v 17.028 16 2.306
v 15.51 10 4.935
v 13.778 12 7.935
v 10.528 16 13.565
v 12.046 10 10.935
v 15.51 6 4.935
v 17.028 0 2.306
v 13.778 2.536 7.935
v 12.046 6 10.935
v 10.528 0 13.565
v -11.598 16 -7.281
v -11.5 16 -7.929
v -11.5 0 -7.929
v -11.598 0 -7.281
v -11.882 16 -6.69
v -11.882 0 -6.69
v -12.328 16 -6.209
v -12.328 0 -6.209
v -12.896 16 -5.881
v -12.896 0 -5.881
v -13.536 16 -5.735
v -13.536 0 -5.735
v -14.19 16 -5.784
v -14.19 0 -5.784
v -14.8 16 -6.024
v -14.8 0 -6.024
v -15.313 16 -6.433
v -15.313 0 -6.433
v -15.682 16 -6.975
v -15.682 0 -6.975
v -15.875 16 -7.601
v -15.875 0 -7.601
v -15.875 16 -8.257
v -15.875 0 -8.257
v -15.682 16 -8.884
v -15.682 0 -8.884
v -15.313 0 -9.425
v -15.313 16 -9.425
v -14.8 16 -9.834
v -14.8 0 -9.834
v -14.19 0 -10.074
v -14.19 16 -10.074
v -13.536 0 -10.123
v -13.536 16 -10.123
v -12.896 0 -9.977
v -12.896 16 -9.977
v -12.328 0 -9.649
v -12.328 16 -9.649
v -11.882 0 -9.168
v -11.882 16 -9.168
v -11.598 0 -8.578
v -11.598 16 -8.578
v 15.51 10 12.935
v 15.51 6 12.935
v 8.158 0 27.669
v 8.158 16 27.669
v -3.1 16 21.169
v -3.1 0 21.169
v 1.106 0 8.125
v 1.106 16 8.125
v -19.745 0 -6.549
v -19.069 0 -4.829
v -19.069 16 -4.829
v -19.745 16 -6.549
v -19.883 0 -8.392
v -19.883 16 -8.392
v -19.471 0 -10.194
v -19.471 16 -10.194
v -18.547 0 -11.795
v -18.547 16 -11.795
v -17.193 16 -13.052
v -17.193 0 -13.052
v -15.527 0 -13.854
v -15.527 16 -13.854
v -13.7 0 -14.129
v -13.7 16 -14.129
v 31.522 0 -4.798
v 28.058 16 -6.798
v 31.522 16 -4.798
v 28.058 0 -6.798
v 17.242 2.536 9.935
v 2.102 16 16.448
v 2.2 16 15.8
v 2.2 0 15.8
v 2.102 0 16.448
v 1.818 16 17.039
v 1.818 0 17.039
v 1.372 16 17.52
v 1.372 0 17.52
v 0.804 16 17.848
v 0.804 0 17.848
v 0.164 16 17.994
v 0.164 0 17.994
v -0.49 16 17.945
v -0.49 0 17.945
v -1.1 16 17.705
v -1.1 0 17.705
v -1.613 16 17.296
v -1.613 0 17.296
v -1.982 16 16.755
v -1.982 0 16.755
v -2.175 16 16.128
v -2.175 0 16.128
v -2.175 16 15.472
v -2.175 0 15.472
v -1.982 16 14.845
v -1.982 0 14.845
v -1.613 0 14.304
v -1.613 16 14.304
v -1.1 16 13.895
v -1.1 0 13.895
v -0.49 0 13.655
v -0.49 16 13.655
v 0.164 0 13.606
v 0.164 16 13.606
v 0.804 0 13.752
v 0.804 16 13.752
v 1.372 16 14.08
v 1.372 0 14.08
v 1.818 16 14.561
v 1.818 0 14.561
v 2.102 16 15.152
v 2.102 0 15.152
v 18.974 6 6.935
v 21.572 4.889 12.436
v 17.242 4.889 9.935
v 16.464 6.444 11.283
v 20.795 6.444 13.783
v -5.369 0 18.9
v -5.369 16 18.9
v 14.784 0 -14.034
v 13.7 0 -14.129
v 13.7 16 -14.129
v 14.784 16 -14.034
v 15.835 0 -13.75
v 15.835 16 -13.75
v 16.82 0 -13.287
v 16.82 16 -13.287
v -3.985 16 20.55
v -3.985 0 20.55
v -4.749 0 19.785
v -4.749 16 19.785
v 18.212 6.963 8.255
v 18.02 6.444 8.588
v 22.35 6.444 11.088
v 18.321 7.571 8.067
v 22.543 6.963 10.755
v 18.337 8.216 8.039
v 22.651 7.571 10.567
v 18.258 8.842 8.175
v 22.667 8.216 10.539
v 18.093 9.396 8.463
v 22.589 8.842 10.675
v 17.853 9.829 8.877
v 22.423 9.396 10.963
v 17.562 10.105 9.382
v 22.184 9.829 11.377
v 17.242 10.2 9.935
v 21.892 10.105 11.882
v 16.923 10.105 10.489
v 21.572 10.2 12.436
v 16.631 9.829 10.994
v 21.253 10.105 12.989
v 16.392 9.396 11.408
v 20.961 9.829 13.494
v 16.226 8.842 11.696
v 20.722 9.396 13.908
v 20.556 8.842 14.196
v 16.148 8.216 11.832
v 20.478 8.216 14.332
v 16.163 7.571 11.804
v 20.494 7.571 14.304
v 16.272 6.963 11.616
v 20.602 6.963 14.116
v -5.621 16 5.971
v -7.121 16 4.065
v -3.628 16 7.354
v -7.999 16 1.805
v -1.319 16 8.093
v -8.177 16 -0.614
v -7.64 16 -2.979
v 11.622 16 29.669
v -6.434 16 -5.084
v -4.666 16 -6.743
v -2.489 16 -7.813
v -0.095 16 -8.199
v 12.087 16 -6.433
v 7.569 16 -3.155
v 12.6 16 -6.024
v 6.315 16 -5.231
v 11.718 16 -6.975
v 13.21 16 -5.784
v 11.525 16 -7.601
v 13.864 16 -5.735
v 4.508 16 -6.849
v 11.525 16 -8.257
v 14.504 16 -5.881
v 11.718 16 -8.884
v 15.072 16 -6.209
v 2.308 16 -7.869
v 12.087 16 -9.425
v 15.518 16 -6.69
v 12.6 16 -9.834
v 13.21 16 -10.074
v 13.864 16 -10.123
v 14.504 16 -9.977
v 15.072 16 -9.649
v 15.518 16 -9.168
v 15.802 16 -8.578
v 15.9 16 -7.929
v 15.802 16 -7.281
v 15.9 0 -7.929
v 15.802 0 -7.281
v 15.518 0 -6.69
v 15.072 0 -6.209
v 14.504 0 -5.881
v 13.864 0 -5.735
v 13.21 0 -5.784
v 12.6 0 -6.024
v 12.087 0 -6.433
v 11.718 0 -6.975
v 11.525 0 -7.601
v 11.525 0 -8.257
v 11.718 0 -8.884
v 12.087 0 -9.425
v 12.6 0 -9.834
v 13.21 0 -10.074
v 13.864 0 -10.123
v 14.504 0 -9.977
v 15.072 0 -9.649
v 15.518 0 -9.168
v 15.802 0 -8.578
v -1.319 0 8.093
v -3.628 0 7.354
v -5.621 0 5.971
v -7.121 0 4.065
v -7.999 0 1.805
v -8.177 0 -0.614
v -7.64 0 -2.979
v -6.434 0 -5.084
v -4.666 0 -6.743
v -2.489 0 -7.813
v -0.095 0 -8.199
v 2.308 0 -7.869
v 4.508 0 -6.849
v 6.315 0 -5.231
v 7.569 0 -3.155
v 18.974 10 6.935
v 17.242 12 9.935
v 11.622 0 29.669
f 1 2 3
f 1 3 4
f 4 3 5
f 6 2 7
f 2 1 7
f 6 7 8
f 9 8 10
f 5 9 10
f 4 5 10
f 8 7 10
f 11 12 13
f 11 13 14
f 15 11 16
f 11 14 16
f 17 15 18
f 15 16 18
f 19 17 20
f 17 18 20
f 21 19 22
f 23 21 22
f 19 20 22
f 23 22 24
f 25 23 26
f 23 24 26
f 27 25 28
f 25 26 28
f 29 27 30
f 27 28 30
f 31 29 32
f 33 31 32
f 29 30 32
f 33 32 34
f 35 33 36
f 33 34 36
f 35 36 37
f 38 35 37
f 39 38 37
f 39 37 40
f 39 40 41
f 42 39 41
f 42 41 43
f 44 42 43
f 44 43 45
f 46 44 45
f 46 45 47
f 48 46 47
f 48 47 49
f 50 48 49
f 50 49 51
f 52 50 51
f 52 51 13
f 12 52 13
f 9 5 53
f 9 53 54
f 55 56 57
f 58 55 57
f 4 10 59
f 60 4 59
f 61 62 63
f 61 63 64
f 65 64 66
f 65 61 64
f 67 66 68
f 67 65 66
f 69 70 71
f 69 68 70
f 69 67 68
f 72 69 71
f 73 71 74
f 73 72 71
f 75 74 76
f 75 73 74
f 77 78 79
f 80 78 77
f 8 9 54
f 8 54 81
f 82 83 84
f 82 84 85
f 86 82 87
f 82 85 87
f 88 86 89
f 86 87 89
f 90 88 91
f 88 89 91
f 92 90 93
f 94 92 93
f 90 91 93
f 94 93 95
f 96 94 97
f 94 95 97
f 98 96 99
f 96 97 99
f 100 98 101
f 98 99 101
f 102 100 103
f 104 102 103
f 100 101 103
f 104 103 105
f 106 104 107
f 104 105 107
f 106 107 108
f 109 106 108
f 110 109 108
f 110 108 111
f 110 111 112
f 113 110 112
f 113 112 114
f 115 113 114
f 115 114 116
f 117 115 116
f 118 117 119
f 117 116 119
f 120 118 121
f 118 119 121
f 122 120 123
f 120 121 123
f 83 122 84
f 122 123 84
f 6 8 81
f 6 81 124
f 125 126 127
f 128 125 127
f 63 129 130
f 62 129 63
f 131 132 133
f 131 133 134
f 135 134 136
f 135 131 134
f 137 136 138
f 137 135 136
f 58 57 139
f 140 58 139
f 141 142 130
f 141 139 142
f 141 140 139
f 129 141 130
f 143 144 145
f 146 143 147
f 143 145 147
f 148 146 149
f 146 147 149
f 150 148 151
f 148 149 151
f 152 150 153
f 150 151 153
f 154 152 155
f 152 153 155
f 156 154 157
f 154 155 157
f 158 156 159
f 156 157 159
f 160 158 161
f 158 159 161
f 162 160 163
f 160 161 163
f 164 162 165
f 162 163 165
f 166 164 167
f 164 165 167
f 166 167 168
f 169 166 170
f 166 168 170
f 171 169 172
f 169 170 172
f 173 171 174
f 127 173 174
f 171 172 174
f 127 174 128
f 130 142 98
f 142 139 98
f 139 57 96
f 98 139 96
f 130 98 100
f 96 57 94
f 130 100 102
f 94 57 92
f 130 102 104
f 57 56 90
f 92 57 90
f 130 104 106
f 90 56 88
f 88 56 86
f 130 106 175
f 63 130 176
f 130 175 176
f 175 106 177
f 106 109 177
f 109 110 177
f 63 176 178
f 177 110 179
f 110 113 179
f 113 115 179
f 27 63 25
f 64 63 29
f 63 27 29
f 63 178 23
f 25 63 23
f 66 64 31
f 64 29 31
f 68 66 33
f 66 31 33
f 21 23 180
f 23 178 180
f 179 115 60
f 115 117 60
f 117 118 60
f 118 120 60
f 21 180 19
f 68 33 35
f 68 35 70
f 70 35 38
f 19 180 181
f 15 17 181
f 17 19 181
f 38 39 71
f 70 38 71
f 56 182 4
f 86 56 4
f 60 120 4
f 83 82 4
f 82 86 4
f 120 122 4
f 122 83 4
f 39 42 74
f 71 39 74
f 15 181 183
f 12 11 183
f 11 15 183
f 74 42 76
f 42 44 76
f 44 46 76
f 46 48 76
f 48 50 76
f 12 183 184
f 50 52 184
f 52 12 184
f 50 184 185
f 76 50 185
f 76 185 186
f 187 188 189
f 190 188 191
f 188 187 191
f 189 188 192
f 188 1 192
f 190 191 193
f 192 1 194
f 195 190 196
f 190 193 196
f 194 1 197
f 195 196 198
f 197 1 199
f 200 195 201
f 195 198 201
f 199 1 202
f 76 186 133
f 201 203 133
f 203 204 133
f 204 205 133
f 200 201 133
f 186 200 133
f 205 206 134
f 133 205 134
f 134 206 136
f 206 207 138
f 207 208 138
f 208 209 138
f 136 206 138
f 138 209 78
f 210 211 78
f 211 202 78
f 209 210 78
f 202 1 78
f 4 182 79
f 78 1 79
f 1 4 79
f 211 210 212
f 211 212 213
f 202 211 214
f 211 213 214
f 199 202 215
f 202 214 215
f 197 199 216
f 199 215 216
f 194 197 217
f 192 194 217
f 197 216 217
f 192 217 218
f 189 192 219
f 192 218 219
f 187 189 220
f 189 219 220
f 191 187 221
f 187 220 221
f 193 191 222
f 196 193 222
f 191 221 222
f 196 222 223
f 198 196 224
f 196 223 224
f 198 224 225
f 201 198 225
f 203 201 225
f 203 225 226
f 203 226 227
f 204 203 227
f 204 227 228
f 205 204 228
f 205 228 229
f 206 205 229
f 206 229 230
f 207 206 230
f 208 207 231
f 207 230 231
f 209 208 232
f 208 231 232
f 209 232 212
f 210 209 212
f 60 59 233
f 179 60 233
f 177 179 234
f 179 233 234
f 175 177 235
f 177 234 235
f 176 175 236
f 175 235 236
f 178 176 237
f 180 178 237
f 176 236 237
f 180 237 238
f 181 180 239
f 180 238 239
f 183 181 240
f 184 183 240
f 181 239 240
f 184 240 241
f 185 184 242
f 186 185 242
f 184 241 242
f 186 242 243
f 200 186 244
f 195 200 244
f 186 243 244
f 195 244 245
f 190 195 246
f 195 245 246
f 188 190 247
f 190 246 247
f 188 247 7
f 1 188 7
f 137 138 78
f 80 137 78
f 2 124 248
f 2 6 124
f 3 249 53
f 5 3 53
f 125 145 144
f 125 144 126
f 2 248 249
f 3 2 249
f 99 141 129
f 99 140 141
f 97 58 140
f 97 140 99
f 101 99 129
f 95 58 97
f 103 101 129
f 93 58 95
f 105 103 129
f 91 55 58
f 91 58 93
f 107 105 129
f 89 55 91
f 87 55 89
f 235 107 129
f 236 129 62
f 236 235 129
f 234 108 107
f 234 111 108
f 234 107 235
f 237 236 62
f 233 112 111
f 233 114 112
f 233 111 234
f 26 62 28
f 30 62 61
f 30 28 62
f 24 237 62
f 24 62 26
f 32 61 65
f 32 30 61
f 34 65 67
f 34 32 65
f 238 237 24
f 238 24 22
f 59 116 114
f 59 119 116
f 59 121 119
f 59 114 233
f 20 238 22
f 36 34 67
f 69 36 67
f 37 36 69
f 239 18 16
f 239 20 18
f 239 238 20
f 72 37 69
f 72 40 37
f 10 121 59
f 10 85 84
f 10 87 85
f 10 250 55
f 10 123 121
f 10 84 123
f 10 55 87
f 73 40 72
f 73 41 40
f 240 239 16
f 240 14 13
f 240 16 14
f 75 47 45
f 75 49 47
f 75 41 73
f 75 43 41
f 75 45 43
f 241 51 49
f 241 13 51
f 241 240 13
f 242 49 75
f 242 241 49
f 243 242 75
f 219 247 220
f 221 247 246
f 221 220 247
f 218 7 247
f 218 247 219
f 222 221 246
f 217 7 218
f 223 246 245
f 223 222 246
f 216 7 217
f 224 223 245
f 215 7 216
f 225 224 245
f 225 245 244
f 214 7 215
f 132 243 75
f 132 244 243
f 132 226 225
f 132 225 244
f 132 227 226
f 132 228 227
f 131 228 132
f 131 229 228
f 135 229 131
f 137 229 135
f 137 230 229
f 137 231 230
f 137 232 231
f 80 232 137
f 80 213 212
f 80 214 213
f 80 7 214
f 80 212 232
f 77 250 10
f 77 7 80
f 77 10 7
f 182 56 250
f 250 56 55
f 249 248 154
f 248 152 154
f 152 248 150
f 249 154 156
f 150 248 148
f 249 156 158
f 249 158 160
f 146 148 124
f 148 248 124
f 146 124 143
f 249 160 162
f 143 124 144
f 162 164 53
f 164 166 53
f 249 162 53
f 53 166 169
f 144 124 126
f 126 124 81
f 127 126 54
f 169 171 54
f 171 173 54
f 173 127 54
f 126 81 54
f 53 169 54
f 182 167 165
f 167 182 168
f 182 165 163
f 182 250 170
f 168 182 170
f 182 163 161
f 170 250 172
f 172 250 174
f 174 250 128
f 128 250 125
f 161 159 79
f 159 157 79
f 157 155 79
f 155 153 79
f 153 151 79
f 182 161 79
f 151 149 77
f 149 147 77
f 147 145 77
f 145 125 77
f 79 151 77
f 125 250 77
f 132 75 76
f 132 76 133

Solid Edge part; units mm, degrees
sketch "Sketch1" plane through (0, 0, 0) normal (0, -1, 0) x (1, 0, 0)
  line L0 (-5.3694, 18.9) -> (-19.0694, -4.8291)
  arc A0 (-13.7, -14.1291) -> (-19.0694, -4.8291) centre (-13.7, -7.9291) cw
  line L1 (-13.7, -14.1291) -> (13.7, -14.1291)
  arc A1 (19.0694, -4.8291) -> (13.7, -14.1291) centre (13.7, -7.9291) cw
  line L2 (5.3694, 18.9) -> (19.0694, -4.8291)
  arc A2 (-5.3694, 18.9) -> (5.3694, 18.9) centre (0, 15.8) cw
  dimension "D1" = 5.3694
extrude "Protrusion1" add sketch "Sketch1" against normal blind 16
sketch "Sketch2" plane through (0, 0, 0) normal (0, -1, 0) x (1, 0, 0)
  circle A0 centre (-13.7, -7.9291) radius 2.2
  circle A1 centre (13.7, -7.9291) radius 2.2
  circle A2 centre (0, 15.8) radius 2.2
  dimension "D1" = 32.8
  dimension "D2" = 4
  dimension "D3" = 4.4
  dimension "D4" = 6.2
  dimension "D5" = 6.2
  dimension "D6" = 4.4
  dimension "D7" = 6.2
  dimension "D8" = 27.4
  dimension "D9" = 27.4
  dimension "D10" = 27.4
extrude "Cutout1" cut sketch "Sketch2" against normal blind 457.8755
sketch "Sketch3" plane through (0, 0, 0) normal (0, -1, 0) x (1, 0, 0)
  circle A0 centre (0, 0) radius 8.2
extrude "Cutout2" cut sketch "Sketch3" against normal blind 434.4917
sketch "Sketch4" plane through (0, 0, 3.9355) normal (0, -1, 0) x (-0.5, 0, 0.866)
  line L0 (-23.325, -5.9323) -> (-23.325, -18.9323)
  line L1 (-23.325, -18.9323) -> (16.475, -18.9323)
  line L2 (16.475, -18.9323) -> (16.475, -5.9323)
  line L3 (12.7755, -8.7037) -> (16.475, -5.9323)
  line L4 (-20.9306, -8.7037) -> (12.7755, -8.7037)
  line L5 (-20.9306, -5.9323) -> (-20.9306, -8.7037)
  line L6 (-23.325, -5.9323) -> (-20.9306, -5.9323)
  dimension "D1" = 13
extrude "Protrusion2" add sketch "Sketch4" against normal up to vertex (16 mm away)
sketch "Sketch5" plane through (3.1086, 0, 6.2098) normal (0, -1, 0) x (-0.5, 0, 0.866)
  line L0 (-10.3403, 2.4623) -> (-10.3403, -10.1029)
  line L1 (-10.3403, -10.1029) -> (2.6597, -10.1029)
  line L2 (2.6597, -10.1029) -> (2.6597, 2.4623)
  line L3 (2.6597, 2.4623) -> (-10.3403, 2.4623)
  dimension "D1" = 5
  dimension "D2" = 5
  dimension "D3" = 5
extrude "ExtrudedCutout_18" cut sketch "Sketch5" against normal blind 196.9446
sketch "Sketch6" plane through (13.7782, 8, 7.9355) normal (-0.866, 0, -0.5) x (0, -1, 0)
  line L0 (-2, 3.4641) -> (2, 3.4641)
  line L1 (-4, 0) -> (-2, 3.4641)
  line L2 (-2, -3.4641) -> (-4, 0)
  line L3 (2, -3.4641) -> (-2, -3.4641)
  line L4 (5.4641, 0) -> (2, -3.4641)
  line L5 (2, 3.4641) -> (5.4641, 0)
extrude "ExtrudedCutout_19" cut sketch "Sketch6" against normal blind 4
sketch "Sketch7" plane through (18.1083, 8, 10.4355) normal (0.866, 0, 0.5) x (-0.5, 0, 0.866)
  line L0 (-19.9, 8) -> (19.9, 8)
  line L1 (19.9, -8) -> (19.9, 8)
  line L2 (-19.9, -8) -> (19.9, -8)
  line L3 (-19.9, -8) -> (-19.9, 8)
extrude "ExtrudedProtrusion_14" add sketch "Sketch7" along normal blind 4
sketch "Sketch8" plane through (21.5724, 8, 12.4355) normal (0.866, 0, 0.5) x (-0.5, 0, 0.866)
  line L0 (-1.5556, 1.5556) -> (0, 3.1113)
  line L1 (0, 3.1113) -> (1.5556, 1.5556)
  arc A0 (1.5556, 1.5556) -> (-1.5556, 1.5556) centre (0, 0) cw
extrude "ExtrudedCutout_20" cut sketch "Sketch8" against normal blind 25.1595
